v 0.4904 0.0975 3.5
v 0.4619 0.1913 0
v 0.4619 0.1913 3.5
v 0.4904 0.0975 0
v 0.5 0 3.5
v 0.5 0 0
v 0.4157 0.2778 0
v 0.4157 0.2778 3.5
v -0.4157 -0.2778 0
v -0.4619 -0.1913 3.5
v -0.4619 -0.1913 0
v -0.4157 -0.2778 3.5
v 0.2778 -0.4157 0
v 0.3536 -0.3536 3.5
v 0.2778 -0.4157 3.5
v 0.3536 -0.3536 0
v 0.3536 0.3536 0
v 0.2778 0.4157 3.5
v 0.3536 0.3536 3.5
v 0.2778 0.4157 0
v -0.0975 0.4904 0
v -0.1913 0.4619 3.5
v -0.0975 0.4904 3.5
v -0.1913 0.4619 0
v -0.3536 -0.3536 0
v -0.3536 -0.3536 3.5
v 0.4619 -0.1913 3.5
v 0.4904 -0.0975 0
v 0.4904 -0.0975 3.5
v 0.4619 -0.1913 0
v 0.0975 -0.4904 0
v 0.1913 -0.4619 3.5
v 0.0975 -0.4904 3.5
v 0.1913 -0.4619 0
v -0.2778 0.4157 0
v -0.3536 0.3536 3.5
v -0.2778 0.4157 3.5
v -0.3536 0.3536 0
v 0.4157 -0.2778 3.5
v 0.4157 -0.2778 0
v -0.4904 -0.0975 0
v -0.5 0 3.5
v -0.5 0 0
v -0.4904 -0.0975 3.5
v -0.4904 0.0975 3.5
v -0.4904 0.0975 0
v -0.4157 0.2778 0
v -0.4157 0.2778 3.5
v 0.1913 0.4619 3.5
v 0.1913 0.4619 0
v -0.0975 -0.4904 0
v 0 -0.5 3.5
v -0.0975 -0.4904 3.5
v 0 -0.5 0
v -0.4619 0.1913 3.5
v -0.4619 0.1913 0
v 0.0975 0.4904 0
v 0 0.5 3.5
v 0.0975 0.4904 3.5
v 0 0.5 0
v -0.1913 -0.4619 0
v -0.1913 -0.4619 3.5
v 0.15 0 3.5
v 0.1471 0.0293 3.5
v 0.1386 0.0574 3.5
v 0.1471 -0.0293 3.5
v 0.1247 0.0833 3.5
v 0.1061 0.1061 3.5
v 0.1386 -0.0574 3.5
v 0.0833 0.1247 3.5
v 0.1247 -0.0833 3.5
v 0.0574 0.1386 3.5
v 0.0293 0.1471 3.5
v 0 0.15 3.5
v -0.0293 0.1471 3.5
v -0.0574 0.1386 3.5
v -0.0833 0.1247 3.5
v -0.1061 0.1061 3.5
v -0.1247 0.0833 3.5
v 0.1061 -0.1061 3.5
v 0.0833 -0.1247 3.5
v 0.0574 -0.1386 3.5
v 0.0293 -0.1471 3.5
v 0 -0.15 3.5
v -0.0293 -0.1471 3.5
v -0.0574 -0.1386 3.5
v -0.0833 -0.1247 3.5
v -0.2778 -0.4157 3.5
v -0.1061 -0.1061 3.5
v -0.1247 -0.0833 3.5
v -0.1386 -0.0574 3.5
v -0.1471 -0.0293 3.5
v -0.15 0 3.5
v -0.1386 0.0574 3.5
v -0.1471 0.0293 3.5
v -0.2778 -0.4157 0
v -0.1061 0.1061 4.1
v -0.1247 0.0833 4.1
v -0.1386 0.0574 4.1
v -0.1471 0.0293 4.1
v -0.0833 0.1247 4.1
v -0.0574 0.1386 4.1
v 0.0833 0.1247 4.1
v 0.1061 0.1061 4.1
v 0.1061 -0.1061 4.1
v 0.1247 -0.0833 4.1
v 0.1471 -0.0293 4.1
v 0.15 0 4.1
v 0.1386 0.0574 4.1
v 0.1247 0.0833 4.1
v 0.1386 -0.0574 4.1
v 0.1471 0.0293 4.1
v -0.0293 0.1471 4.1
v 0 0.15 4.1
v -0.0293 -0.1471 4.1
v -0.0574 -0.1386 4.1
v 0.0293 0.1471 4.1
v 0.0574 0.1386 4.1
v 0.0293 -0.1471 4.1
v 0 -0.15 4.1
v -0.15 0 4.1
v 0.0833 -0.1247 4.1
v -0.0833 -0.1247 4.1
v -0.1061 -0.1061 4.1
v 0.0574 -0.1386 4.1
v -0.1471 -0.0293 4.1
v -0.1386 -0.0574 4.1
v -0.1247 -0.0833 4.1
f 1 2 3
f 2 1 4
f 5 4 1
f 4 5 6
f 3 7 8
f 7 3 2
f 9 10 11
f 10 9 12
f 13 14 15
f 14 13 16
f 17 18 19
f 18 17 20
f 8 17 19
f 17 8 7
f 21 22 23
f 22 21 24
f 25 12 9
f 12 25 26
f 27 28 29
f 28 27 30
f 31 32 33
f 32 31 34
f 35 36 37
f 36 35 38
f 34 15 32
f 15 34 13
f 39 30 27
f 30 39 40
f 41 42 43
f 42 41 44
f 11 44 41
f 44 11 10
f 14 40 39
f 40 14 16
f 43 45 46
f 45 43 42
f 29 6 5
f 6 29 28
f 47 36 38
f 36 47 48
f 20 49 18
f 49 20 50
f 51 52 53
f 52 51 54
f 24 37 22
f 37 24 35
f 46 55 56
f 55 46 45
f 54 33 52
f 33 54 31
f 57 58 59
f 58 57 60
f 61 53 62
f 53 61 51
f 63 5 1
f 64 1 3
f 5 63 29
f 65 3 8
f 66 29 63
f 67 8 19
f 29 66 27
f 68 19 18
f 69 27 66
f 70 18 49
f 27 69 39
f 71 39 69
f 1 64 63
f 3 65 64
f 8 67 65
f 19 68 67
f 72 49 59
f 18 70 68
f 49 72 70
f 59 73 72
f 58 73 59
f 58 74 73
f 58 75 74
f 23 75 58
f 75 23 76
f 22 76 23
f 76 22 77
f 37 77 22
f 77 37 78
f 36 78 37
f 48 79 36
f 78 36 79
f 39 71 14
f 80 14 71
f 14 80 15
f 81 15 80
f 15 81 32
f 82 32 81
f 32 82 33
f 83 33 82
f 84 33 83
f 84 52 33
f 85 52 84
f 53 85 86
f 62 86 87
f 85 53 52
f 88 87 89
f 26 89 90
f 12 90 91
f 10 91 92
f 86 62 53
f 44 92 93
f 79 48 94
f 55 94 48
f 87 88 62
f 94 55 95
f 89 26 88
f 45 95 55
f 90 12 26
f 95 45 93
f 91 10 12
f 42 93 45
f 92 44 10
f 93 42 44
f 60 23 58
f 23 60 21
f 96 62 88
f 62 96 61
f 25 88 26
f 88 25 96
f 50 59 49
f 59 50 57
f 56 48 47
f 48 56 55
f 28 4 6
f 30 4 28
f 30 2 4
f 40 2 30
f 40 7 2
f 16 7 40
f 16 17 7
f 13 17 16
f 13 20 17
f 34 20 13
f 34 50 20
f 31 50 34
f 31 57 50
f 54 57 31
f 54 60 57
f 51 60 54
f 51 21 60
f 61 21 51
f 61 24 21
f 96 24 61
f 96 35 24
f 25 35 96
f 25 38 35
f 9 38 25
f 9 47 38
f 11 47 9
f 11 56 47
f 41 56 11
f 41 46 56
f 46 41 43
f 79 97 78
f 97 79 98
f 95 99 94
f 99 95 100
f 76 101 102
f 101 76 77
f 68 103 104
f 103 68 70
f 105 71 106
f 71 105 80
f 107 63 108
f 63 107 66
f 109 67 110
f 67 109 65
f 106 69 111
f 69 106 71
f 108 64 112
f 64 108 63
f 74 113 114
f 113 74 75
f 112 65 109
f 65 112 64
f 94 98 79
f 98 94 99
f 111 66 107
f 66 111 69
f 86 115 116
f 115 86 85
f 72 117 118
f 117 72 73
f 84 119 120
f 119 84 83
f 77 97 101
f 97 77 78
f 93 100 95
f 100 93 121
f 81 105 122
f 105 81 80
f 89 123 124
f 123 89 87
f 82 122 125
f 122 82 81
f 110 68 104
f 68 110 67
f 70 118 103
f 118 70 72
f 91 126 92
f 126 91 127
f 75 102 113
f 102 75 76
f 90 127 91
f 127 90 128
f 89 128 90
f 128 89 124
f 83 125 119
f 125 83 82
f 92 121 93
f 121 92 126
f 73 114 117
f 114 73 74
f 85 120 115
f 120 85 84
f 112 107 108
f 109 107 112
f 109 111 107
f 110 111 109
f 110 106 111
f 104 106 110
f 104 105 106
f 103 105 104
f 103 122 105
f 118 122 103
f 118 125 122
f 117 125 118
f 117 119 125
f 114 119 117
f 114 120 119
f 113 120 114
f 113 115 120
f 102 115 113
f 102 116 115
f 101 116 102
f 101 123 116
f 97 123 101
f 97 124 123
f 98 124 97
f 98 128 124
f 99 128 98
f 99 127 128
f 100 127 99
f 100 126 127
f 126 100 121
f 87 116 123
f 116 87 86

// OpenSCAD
// Parameters
body_diameter_mm = 1.0; //[0.5:2.0:0.05]
overall_height_mm = 4.7; //[2.35:9.4:0.1]
body_height_mm = 3.5; //[1.75:7.0:0.1]
lever_height_mm = 1.2; //[0.6:2.4:0.05]
lever_diameter_mm = 0.3; //[0.15:0.6:0.01]
connection_overlap_mm = 0.6; //[0.2:1.5:0.1]

// Toggle switch - complete geometry
module toggle() {
  union() {
    // Toggle switch body
    color("DimGray") {
      translate([0, 0, body_height_mm / 2])
        cylinder(r=body_diameter_mm / 2, h=body_height_mm, center=true, $fn=32);
    }
    // Actuator lever
    color("Silver") {
      translate([0, 0, body_height_mm + lever_height_mm / 2 - connection_overlap_mm])
        cylinder(r=lever_diameter_mm / 2, h=lever_height_mm, center=true, $fn=32);
    }
  }
}

// Assembly
module assembly() {
  toggle();
}

assembly();
